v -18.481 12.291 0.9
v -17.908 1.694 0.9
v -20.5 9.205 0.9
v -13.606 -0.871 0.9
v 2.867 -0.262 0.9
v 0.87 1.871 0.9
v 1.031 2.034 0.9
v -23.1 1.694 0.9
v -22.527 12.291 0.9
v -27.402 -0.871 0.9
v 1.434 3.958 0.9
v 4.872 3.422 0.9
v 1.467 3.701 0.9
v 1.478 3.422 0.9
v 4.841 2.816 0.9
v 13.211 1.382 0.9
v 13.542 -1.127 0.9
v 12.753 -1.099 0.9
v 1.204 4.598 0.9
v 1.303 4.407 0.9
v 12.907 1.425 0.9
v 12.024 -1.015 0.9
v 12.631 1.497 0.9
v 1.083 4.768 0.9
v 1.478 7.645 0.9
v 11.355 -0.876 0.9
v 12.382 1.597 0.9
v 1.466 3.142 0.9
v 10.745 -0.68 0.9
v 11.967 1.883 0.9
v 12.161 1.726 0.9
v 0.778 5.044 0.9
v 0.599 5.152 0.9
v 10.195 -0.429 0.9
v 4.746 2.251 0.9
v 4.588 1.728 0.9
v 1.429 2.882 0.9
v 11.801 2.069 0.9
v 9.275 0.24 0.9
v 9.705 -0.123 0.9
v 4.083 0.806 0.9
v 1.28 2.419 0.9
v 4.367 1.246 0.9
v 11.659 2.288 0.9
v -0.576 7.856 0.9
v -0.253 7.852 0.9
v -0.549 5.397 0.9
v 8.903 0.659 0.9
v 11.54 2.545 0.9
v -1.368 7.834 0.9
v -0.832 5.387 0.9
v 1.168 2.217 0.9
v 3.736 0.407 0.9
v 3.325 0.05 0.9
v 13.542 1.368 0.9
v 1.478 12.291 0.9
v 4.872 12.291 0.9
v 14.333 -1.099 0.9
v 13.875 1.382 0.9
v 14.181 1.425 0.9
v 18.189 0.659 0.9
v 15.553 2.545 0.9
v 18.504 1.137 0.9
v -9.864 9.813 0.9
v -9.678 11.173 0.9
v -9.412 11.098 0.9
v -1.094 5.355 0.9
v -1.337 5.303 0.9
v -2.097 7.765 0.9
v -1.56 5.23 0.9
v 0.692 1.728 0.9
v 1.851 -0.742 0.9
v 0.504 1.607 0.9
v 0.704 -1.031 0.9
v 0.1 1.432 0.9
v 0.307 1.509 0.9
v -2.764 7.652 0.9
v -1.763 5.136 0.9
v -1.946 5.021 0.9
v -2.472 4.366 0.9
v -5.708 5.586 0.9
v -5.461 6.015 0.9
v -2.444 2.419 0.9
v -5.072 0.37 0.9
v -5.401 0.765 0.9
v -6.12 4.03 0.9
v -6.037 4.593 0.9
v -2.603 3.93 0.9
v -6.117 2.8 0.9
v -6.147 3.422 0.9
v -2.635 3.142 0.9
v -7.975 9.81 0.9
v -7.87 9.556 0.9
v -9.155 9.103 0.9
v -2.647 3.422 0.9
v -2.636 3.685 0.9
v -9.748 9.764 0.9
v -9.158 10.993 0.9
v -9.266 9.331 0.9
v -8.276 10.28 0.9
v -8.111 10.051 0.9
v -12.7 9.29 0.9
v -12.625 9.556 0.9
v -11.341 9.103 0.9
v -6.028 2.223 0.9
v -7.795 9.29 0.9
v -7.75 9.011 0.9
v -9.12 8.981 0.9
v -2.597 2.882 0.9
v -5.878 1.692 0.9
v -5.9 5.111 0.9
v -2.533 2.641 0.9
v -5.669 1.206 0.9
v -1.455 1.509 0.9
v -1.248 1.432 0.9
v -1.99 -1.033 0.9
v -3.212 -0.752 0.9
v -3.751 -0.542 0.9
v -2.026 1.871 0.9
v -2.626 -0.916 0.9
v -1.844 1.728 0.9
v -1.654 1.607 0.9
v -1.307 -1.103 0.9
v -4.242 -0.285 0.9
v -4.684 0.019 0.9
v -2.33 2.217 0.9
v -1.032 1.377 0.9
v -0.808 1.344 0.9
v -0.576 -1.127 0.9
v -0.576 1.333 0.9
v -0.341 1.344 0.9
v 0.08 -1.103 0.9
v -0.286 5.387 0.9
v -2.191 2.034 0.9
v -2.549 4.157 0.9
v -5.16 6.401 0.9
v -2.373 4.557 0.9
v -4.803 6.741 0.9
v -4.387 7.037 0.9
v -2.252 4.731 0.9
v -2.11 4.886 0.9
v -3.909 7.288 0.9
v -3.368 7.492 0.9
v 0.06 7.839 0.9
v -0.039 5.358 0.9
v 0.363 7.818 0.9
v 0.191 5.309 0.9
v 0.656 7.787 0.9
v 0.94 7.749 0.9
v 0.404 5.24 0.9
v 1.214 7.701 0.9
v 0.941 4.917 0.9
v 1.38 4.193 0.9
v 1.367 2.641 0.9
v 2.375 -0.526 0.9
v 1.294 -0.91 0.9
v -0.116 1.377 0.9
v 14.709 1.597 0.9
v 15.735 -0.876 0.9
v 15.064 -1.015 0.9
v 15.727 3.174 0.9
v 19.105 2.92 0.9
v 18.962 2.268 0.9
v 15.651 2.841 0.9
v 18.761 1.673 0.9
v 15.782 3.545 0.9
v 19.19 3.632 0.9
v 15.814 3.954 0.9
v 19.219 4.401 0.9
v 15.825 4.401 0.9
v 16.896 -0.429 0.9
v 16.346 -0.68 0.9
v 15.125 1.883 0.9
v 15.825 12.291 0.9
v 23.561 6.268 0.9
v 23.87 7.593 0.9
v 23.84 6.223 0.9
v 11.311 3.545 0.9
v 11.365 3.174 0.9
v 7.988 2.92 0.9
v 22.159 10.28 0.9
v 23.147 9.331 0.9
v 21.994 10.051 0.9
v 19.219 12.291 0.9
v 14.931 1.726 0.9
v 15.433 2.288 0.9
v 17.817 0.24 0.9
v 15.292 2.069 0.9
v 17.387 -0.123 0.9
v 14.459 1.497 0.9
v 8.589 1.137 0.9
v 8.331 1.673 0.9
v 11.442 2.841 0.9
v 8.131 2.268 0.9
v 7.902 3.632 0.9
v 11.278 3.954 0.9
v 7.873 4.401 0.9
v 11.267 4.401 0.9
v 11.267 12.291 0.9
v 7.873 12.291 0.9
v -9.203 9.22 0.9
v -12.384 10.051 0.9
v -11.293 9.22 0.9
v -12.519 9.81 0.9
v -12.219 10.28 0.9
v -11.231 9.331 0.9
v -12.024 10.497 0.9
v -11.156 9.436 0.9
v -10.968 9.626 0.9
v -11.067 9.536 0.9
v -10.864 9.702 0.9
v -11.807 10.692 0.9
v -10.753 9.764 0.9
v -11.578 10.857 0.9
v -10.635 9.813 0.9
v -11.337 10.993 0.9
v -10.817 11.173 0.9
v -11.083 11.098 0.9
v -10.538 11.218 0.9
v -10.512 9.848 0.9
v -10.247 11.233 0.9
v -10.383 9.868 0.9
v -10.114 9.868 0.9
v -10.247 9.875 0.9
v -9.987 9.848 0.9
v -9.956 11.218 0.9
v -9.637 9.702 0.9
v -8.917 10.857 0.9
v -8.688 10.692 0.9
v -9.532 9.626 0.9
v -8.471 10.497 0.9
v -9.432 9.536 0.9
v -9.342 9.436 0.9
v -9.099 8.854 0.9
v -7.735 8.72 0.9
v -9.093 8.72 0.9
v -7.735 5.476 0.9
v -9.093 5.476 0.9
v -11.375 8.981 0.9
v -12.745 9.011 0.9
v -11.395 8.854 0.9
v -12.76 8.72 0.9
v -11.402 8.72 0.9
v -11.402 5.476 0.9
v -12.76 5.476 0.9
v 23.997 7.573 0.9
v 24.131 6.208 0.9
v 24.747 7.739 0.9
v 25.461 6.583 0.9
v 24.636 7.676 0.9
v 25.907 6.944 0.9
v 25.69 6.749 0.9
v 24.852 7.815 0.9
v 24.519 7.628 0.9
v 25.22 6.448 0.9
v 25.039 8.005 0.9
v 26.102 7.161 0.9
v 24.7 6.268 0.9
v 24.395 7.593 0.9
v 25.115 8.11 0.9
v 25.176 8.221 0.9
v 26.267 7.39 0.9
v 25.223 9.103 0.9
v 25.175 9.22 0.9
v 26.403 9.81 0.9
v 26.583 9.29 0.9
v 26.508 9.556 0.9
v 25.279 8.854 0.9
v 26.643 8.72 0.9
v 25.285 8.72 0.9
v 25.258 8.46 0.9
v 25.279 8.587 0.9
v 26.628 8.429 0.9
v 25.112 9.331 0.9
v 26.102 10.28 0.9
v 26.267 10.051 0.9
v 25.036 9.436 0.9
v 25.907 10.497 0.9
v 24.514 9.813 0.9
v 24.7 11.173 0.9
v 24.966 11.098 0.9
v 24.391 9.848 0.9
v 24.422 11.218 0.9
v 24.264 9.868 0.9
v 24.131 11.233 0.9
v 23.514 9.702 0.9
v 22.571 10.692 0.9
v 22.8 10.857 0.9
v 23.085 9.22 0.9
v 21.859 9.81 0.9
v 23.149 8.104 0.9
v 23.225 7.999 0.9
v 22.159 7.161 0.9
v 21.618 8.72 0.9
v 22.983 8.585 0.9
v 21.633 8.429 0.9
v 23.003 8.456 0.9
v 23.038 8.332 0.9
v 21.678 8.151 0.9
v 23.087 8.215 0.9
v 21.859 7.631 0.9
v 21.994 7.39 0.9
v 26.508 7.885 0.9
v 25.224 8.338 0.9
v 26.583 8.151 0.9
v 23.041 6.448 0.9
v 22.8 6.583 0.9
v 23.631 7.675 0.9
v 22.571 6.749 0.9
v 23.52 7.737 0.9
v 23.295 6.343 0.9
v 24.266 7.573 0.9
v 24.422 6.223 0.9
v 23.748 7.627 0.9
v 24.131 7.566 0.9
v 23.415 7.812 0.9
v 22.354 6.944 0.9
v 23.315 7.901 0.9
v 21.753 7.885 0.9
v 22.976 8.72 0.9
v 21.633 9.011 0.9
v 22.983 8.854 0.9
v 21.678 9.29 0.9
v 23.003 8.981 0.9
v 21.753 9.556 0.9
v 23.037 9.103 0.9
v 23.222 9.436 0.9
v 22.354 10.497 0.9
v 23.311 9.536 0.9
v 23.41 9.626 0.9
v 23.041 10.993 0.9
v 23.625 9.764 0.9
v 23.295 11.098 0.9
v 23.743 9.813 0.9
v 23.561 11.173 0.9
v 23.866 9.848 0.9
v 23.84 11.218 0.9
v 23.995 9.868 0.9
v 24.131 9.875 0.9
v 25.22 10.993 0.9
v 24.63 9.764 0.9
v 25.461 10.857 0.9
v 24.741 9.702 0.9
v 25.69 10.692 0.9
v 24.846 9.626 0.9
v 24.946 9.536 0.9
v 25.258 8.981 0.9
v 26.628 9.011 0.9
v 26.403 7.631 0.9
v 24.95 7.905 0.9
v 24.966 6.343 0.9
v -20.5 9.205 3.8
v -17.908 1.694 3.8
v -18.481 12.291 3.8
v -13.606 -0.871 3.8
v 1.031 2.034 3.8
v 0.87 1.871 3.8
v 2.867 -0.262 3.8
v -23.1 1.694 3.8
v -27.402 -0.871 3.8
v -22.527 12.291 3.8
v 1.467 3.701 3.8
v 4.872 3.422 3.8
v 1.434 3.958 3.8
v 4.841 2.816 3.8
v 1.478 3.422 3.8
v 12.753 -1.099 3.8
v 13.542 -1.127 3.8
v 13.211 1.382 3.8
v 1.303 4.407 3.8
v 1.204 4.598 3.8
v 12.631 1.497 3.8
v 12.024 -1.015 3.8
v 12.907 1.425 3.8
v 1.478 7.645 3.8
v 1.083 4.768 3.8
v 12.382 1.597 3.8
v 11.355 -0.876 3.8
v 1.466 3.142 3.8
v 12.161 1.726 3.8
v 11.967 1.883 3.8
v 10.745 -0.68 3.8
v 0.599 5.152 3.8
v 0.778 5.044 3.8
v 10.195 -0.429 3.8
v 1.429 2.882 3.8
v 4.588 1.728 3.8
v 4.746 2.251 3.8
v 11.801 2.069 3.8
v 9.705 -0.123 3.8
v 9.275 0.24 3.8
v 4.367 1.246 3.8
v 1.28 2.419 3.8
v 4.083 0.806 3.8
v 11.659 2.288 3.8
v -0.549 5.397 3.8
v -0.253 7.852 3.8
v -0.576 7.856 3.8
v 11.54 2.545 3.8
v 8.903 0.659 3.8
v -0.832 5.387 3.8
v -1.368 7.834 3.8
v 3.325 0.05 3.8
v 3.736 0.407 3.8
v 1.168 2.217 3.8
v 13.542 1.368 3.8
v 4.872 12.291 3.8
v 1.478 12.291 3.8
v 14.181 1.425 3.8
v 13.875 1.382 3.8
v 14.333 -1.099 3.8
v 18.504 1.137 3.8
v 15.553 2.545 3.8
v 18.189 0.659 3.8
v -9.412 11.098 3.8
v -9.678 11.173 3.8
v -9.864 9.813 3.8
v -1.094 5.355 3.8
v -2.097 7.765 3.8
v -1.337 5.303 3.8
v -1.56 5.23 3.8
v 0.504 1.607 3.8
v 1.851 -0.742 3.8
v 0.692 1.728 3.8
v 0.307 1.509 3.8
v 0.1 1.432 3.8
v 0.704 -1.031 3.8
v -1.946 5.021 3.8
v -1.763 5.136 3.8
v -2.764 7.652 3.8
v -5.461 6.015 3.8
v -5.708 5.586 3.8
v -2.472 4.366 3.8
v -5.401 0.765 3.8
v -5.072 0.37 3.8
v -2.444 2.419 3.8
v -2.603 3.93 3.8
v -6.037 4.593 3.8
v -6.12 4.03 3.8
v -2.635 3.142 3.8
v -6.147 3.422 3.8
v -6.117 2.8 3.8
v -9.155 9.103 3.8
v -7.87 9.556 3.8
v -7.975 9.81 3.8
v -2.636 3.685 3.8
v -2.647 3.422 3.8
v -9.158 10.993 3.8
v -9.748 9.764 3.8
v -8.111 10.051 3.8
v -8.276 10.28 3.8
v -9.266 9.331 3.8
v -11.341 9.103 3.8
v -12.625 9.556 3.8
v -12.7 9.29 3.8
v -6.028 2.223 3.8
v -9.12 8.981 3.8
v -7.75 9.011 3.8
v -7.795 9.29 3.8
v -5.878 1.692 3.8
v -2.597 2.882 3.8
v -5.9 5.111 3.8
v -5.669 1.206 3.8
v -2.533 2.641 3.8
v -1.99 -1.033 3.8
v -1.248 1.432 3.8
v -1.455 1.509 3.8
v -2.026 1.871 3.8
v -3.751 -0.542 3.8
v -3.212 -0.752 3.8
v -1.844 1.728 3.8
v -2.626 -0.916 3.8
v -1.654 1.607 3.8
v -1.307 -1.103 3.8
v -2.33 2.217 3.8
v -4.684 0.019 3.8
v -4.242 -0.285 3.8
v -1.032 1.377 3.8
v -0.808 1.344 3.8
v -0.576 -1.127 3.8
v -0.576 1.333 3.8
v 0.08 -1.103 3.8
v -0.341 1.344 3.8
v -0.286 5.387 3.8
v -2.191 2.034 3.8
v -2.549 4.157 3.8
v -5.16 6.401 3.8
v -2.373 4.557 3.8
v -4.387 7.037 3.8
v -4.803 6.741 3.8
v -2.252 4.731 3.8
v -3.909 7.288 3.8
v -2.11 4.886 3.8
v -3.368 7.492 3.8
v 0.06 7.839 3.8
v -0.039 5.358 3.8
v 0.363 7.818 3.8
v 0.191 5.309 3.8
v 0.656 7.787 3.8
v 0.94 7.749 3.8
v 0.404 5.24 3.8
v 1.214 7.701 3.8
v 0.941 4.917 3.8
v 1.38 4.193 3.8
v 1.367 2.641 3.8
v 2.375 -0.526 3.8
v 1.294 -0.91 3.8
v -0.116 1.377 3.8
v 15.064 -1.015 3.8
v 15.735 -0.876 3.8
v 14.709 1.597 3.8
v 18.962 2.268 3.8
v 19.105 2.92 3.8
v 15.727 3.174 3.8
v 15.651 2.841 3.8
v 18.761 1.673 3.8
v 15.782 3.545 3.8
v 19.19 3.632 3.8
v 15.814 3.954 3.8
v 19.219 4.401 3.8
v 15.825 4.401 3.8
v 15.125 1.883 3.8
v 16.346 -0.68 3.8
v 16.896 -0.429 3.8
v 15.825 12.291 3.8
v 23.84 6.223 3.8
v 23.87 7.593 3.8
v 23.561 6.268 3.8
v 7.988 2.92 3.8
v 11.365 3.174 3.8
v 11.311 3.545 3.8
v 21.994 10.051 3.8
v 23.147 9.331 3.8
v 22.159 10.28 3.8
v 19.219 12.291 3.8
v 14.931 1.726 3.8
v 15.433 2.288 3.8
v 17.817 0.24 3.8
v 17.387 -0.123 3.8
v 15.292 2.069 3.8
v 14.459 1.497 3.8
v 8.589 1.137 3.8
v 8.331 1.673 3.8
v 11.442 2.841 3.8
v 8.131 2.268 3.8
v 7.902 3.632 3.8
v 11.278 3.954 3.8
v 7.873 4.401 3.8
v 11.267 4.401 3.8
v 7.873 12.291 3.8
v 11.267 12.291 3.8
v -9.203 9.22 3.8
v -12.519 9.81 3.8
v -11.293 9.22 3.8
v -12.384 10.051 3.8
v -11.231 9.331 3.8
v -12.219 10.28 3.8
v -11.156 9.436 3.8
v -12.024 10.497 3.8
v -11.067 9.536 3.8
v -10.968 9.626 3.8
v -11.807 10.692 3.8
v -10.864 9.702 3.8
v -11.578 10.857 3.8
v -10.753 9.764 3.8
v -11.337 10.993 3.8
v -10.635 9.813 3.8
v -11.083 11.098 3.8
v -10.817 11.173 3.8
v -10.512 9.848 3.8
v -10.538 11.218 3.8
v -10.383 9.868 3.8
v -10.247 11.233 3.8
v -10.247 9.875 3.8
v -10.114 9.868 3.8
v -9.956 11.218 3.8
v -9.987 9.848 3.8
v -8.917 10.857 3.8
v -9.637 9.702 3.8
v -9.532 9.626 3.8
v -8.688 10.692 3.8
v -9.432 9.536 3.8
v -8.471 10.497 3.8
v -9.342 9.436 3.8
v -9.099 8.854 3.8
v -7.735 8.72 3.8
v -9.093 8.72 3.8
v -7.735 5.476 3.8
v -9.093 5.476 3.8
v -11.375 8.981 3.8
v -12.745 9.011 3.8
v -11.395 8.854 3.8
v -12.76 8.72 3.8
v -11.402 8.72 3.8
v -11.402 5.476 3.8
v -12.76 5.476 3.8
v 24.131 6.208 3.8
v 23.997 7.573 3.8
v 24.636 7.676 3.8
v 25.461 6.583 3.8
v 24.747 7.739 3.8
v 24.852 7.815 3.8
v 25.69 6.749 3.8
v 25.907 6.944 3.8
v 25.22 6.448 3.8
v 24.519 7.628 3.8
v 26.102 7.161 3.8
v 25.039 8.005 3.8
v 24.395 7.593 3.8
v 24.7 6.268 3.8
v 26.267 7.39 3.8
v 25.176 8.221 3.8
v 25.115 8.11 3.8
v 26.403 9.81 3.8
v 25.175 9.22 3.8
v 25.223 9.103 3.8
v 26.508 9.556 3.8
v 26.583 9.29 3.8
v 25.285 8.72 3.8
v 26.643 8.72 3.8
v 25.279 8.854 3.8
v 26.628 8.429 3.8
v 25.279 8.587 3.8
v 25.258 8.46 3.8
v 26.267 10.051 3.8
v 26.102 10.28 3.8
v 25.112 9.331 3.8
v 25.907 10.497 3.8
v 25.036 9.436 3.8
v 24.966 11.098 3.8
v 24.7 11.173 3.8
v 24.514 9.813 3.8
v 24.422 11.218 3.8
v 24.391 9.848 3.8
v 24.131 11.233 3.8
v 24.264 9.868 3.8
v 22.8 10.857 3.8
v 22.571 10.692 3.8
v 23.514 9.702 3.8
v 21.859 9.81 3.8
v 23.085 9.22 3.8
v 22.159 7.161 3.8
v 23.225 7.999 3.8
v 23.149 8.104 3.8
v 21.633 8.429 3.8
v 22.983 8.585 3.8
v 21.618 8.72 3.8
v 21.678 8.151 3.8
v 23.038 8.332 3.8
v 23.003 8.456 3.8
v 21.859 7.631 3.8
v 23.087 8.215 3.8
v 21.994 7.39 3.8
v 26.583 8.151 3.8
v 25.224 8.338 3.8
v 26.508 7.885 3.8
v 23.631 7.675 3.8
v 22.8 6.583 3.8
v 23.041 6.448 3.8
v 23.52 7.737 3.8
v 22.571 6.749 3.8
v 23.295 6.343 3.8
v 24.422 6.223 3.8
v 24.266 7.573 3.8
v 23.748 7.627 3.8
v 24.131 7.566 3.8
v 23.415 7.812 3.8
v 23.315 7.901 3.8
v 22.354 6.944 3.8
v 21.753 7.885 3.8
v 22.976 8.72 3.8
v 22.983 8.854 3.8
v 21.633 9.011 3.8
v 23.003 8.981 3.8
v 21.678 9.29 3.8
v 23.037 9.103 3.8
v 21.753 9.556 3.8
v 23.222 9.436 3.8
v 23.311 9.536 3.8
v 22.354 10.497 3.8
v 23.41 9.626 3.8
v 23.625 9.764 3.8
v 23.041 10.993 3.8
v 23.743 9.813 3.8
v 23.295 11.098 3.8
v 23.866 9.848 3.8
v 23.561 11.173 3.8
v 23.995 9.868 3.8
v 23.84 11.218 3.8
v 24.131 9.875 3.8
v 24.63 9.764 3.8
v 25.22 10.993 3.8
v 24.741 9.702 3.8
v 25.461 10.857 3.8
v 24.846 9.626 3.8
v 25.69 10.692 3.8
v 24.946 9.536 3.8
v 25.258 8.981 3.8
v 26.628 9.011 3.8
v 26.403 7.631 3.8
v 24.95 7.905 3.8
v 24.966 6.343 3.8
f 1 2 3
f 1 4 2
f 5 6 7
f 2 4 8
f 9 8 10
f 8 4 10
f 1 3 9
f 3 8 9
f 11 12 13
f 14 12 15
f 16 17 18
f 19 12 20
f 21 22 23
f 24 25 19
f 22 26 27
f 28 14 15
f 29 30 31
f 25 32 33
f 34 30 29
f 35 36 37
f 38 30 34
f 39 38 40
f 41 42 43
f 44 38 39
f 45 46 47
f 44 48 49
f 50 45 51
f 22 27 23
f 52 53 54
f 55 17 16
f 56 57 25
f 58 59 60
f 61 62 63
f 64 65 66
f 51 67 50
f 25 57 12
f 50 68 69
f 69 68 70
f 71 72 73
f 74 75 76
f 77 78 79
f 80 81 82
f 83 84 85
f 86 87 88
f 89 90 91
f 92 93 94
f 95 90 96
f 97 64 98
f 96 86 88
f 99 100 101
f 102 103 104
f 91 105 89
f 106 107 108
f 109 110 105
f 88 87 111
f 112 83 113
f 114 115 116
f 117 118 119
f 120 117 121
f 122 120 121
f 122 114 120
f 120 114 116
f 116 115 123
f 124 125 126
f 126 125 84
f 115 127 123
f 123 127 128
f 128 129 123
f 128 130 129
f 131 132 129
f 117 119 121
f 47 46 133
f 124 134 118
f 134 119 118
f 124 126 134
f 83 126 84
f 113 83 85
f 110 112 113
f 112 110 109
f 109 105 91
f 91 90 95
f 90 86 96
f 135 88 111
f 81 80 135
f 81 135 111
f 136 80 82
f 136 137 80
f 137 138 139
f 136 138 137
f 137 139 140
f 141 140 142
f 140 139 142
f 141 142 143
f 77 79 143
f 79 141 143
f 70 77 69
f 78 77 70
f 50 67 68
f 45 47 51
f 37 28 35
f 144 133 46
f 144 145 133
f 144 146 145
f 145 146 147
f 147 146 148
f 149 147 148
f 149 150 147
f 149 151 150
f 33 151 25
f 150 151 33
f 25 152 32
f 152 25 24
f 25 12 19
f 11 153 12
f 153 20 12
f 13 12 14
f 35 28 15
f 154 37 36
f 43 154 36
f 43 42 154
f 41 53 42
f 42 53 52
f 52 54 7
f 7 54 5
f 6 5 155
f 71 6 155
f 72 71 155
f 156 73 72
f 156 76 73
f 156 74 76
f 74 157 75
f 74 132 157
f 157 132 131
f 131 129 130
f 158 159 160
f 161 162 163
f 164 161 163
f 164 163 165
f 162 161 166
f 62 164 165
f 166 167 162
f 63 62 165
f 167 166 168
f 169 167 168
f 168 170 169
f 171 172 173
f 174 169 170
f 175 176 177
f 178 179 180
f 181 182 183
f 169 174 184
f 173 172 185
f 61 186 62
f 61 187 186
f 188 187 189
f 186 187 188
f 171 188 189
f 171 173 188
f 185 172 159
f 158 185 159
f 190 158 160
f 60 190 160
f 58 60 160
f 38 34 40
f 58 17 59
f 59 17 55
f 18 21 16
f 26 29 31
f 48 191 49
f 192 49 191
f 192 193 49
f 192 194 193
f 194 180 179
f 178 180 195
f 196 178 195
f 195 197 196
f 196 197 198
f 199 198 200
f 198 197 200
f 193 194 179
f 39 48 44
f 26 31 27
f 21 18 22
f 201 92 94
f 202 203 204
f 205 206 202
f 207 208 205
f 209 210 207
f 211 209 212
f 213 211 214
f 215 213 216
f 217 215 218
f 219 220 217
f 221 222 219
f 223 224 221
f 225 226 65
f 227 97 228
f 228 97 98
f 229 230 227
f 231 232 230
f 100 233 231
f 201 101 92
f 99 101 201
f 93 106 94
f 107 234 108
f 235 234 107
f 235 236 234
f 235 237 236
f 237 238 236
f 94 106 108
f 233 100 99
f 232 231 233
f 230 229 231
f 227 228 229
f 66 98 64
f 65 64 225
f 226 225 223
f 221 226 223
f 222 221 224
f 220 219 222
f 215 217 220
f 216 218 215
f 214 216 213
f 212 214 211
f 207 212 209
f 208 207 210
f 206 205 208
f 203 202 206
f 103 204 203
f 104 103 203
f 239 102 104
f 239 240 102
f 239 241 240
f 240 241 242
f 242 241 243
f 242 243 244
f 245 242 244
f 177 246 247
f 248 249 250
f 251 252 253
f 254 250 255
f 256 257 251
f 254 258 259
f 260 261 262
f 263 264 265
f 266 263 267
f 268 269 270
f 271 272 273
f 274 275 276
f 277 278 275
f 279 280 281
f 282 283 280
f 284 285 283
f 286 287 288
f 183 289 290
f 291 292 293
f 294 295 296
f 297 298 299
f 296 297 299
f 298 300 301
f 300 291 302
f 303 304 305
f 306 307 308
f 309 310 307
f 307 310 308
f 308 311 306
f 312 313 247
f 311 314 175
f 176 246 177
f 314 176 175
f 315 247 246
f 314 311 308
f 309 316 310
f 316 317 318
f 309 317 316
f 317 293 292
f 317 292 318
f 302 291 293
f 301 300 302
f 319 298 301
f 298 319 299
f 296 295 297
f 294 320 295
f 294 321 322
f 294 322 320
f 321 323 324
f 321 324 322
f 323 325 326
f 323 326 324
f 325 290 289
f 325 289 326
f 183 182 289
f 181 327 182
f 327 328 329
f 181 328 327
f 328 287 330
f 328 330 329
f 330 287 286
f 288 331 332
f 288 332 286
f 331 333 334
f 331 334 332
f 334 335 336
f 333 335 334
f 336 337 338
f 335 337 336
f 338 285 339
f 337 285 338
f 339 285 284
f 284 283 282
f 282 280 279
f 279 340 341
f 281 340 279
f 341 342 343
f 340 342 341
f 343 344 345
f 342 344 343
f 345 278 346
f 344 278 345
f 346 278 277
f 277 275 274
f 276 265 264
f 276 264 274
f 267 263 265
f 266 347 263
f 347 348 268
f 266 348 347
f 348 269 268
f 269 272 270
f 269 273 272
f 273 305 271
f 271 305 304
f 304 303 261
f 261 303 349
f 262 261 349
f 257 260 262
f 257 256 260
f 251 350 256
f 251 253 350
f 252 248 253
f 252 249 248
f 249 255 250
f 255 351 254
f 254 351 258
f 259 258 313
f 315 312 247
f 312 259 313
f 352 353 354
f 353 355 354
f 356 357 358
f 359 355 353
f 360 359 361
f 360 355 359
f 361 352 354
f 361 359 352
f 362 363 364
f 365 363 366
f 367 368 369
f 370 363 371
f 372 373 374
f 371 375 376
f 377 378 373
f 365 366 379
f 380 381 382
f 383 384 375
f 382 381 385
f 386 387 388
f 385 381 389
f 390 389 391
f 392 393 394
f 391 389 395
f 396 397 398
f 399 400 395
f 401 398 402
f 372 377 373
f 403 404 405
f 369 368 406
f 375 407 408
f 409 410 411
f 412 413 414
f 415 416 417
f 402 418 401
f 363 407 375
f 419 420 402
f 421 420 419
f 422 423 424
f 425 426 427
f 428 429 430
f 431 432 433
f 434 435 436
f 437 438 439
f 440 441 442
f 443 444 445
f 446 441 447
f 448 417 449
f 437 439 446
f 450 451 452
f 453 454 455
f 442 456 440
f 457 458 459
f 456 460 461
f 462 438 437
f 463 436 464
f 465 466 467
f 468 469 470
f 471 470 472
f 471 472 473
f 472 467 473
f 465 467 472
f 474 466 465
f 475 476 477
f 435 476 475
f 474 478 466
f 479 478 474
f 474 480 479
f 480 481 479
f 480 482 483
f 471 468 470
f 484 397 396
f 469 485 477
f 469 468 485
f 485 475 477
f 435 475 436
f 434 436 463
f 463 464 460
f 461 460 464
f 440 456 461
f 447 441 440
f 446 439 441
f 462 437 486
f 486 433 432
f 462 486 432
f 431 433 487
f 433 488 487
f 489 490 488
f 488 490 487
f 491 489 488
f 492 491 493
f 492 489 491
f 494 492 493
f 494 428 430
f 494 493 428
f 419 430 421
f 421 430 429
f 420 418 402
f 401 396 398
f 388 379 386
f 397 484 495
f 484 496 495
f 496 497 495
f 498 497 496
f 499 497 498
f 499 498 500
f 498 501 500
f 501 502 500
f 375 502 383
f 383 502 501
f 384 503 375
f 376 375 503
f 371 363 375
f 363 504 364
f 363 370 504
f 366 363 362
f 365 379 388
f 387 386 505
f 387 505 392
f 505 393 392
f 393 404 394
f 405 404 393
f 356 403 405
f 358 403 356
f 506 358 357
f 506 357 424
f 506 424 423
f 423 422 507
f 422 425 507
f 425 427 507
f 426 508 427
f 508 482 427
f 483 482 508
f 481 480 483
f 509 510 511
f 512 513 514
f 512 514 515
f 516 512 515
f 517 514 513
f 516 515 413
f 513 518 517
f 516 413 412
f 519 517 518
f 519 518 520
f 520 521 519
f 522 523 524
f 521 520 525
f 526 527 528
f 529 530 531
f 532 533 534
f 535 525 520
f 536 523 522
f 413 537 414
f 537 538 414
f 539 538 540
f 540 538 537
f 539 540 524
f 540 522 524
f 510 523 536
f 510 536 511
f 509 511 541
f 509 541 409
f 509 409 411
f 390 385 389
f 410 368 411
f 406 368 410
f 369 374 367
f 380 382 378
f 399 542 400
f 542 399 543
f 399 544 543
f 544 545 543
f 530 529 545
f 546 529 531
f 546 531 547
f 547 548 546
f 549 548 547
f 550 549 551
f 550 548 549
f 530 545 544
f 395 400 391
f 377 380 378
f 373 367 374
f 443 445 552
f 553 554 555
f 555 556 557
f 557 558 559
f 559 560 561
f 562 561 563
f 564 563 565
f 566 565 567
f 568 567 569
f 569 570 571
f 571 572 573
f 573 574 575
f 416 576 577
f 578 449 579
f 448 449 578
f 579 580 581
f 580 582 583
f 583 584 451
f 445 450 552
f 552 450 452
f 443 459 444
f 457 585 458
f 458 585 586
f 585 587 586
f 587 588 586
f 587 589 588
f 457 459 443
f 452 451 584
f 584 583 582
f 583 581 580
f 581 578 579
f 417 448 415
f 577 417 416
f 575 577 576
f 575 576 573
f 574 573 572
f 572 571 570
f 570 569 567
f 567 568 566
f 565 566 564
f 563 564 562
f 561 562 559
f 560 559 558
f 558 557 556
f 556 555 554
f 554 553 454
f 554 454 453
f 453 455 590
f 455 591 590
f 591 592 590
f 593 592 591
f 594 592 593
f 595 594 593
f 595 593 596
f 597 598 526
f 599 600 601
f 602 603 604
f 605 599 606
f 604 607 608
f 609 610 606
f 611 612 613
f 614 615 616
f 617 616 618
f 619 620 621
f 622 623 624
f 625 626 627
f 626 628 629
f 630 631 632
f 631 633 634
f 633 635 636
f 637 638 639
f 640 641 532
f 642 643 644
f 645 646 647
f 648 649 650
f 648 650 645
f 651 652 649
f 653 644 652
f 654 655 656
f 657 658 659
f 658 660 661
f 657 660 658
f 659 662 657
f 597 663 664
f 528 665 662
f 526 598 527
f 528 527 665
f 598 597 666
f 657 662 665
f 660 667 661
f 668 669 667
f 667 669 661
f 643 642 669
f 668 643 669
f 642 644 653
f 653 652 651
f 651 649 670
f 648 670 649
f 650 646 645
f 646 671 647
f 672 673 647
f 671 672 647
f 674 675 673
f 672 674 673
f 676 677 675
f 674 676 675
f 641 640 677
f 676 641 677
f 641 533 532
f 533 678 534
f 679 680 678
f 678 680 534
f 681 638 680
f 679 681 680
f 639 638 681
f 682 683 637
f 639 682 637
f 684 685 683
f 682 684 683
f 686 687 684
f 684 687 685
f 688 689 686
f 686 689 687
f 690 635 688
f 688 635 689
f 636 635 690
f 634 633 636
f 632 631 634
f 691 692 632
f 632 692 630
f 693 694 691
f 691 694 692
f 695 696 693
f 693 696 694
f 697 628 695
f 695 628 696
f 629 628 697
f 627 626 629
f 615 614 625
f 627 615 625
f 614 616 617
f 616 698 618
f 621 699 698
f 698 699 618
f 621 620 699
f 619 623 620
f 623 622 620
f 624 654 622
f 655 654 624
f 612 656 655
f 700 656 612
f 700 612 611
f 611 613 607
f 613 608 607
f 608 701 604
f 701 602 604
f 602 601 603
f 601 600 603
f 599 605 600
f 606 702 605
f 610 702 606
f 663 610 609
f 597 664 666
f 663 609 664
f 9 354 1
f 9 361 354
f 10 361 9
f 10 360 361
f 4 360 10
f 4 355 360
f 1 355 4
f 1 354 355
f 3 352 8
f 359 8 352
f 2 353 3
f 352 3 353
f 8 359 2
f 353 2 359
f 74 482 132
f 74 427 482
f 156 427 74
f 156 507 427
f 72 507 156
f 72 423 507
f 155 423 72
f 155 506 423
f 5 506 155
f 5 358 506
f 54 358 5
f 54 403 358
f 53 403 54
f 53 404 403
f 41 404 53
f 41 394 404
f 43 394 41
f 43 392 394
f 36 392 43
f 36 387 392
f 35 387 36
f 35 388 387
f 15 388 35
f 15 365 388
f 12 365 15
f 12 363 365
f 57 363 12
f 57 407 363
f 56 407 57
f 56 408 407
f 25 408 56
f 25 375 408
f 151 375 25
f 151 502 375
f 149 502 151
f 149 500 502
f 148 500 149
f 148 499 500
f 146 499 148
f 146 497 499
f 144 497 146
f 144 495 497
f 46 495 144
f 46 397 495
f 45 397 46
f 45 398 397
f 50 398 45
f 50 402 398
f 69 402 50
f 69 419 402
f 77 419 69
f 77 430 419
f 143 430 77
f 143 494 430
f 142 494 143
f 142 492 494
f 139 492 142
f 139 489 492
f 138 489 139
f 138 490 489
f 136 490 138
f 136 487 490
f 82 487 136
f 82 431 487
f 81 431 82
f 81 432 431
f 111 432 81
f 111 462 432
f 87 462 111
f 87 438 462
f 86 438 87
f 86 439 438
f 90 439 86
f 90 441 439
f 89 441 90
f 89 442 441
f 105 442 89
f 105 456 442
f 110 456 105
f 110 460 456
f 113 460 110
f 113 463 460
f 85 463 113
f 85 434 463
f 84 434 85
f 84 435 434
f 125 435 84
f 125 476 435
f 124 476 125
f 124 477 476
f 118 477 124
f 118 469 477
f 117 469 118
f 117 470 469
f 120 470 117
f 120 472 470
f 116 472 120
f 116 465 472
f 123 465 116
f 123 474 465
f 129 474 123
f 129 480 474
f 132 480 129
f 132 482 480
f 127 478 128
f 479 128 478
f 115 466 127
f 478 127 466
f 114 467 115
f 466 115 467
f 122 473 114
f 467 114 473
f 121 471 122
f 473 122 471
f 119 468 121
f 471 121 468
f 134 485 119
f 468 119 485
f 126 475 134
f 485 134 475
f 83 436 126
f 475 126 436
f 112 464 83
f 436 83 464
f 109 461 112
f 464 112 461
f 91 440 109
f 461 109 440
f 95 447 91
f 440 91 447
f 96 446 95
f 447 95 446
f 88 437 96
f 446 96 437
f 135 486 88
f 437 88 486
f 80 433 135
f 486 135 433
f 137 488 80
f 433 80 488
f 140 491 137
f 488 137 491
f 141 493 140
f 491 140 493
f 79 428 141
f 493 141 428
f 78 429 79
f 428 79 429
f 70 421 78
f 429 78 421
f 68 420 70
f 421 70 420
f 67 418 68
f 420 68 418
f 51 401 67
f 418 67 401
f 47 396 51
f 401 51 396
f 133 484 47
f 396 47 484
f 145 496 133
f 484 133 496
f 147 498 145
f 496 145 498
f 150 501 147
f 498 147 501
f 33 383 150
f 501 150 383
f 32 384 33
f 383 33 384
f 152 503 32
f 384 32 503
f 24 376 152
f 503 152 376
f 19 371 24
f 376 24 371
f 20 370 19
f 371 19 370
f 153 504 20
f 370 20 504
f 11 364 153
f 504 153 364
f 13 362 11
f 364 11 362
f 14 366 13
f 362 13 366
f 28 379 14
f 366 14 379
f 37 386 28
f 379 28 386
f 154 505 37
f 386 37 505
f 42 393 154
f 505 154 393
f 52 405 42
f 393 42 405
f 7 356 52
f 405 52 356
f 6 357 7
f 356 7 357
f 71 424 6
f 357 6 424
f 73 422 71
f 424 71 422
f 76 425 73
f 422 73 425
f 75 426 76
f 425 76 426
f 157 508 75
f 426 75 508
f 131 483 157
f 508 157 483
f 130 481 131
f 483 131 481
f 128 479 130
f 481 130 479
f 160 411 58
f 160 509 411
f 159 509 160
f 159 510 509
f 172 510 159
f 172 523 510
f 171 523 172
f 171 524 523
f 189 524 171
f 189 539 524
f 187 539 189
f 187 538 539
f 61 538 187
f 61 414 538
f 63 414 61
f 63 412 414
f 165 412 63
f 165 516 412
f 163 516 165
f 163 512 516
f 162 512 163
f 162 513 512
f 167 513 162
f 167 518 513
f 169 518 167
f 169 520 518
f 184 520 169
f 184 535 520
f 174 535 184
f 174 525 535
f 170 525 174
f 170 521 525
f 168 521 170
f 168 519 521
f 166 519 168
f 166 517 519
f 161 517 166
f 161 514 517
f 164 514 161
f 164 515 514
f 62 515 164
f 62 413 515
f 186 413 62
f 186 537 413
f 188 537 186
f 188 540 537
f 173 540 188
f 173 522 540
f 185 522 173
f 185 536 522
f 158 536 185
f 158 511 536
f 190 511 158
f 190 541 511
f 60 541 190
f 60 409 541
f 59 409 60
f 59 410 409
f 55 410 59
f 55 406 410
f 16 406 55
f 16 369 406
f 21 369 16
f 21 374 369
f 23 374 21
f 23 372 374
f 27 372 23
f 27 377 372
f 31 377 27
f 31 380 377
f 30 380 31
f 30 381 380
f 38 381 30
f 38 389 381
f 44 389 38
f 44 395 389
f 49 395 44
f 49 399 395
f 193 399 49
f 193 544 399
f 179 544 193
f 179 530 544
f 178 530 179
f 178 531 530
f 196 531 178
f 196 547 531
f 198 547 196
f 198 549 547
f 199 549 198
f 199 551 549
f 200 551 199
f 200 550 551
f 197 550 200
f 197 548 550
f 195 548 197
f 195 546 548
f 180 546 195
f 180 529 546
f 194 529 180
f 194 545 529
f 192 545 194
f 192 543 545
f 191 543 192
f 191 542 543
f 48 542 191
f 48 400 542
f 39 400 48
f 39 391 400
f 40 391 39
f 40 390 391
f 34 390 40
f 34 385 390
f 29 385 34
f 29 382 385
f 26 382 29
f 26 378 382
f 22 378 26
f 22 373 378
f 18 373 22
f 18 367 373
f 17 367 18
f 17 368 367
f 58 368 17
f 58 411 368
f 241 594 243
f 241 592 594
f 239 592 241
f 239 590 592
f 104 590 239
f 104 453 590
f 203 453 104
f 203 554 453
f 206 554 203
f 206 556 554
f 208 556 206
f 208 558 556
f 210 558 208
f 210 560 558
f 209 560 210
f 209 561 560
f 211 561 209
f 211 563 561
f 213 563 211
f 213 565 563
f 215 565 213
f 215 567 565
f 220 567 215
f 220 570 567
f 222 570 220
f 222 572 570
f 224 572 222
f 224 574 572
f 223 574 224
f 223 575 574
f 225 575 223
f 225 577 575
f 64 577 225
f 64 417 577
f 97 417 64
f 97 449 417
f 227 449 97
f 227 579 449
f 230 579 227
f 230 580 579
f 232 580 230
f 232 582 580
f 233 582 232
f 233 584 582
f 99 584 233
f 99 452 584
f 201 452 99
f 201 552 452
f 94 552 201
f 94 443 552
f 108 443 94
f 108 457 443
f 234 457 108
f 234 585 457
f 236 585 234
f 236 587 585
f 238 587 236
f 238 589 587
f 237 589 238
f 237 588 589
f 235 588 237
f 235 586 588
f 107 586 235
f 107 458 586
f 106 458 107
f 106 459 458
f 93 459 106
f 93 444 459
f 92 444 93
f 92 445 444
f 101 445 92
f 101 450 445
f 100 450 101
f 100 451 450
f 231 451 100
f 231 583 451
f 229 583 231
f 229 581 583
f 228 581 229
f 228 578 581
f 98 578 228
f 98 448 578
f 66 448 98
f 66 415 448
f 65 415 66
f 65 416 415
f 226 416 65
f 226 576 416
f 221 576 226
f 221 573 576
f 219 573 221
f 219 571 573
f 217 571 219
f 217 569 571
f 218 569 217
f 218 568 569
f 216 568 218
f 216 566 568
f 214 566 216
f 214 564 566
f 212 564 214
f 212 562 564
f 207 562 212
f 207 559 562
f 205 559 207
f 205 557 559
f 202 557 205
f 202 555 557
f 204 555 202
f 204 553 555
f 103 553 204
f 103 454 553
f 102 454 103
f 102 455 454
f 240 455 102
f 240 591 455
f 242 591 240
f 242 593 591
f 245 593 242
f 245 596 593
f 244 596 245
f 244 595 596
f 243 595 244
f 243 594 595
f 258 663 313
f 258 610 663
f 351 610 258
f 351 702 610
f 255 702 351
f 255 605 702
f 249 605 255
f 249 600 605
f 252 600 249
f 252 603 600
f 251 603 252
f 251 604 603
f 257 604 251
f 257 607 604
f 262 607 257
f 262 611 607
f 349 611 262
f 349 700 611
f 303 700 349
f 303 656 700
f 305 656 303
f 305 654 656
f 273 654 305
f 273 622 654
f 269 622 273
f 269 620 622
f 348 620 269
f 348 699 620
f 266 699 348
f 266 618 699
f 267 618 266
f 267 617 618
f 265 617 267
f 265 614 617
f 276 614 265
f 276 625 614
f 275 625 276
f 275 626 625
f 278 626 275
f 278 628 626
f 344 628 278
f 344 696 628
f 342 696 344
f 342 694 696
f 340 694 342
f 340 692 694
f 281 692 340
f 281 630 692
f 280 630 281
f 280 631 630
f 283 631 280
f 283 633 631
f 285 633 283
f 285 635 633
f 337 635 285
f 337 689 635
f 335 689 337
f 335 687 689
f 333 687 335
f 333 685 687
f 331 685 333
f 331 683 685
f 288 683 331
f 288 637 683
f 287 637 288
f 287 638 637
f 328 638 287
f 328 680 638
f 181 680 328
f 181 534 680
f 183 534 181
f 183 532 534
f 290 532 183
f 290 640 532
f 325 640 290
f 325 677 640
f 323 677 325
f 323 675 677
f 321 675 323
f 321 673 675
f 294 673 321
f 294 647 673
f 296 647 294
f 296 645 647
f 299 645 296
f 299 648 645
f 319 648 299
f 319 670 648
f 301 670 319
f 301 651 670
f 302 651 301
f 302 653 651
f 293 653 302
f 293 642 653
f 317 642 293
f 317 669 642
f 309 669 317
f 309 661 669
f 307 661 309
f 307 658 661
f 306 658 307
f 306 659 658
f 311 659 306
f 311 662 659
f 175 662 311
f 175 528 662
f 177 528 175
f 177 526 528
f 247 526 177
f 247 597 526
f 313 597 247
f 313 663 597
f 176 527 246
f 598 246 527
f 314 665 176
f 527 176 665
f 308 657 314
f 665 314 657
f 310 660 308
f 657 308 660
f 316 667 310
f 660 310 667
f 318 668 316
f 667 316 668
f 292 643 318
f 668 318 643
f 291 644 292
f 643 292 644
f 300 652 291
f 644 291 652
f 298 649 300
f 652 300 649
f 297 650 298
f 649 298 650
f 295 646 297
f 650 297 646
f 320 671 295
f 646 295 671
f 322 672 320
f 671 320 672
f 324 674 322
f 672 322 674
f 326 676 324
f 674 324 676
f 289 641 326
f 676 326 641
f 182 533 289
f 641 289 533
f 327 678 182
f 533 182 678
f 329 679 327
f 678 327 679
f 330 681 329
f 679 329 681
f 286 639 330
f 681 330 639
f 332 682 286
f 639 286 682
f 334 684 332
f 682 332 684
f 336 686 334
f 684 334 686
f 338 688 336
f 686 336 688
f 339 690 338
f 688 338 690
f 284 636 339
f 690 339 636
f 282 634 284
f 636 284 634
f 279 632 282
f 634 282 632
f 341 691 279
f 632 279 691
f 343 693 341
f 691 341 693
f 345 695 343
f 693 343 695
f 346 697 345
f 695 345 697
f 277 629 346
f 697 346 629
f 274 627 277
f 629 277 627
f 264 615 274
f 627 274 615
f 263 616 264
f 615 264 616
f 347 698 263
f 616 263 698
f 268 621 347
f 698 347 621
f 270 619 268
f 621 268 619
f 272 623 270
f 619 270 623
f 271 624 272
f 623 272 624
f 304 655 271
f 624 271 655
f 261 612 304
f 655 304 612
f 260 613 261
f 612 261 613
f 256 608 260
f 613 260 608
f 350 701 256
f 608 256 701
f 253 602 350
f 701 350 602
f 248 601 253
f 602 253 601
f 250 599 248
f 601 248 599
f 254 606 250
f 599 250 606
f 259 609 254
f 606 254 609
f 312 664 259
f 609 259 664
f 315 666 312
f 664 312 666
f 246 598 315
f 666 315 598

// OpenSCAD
$fn = 48;
  // syllabics (overlaid on icon, tallest) — row 1
  translate([0, 5.430, 0.900]) linear_extrude(height=2.900) text("ᐃᐢᑯᑌᐤ", size=13.000, halign="center", valign="center", font="Euphemia UCAS:style=Bold");
